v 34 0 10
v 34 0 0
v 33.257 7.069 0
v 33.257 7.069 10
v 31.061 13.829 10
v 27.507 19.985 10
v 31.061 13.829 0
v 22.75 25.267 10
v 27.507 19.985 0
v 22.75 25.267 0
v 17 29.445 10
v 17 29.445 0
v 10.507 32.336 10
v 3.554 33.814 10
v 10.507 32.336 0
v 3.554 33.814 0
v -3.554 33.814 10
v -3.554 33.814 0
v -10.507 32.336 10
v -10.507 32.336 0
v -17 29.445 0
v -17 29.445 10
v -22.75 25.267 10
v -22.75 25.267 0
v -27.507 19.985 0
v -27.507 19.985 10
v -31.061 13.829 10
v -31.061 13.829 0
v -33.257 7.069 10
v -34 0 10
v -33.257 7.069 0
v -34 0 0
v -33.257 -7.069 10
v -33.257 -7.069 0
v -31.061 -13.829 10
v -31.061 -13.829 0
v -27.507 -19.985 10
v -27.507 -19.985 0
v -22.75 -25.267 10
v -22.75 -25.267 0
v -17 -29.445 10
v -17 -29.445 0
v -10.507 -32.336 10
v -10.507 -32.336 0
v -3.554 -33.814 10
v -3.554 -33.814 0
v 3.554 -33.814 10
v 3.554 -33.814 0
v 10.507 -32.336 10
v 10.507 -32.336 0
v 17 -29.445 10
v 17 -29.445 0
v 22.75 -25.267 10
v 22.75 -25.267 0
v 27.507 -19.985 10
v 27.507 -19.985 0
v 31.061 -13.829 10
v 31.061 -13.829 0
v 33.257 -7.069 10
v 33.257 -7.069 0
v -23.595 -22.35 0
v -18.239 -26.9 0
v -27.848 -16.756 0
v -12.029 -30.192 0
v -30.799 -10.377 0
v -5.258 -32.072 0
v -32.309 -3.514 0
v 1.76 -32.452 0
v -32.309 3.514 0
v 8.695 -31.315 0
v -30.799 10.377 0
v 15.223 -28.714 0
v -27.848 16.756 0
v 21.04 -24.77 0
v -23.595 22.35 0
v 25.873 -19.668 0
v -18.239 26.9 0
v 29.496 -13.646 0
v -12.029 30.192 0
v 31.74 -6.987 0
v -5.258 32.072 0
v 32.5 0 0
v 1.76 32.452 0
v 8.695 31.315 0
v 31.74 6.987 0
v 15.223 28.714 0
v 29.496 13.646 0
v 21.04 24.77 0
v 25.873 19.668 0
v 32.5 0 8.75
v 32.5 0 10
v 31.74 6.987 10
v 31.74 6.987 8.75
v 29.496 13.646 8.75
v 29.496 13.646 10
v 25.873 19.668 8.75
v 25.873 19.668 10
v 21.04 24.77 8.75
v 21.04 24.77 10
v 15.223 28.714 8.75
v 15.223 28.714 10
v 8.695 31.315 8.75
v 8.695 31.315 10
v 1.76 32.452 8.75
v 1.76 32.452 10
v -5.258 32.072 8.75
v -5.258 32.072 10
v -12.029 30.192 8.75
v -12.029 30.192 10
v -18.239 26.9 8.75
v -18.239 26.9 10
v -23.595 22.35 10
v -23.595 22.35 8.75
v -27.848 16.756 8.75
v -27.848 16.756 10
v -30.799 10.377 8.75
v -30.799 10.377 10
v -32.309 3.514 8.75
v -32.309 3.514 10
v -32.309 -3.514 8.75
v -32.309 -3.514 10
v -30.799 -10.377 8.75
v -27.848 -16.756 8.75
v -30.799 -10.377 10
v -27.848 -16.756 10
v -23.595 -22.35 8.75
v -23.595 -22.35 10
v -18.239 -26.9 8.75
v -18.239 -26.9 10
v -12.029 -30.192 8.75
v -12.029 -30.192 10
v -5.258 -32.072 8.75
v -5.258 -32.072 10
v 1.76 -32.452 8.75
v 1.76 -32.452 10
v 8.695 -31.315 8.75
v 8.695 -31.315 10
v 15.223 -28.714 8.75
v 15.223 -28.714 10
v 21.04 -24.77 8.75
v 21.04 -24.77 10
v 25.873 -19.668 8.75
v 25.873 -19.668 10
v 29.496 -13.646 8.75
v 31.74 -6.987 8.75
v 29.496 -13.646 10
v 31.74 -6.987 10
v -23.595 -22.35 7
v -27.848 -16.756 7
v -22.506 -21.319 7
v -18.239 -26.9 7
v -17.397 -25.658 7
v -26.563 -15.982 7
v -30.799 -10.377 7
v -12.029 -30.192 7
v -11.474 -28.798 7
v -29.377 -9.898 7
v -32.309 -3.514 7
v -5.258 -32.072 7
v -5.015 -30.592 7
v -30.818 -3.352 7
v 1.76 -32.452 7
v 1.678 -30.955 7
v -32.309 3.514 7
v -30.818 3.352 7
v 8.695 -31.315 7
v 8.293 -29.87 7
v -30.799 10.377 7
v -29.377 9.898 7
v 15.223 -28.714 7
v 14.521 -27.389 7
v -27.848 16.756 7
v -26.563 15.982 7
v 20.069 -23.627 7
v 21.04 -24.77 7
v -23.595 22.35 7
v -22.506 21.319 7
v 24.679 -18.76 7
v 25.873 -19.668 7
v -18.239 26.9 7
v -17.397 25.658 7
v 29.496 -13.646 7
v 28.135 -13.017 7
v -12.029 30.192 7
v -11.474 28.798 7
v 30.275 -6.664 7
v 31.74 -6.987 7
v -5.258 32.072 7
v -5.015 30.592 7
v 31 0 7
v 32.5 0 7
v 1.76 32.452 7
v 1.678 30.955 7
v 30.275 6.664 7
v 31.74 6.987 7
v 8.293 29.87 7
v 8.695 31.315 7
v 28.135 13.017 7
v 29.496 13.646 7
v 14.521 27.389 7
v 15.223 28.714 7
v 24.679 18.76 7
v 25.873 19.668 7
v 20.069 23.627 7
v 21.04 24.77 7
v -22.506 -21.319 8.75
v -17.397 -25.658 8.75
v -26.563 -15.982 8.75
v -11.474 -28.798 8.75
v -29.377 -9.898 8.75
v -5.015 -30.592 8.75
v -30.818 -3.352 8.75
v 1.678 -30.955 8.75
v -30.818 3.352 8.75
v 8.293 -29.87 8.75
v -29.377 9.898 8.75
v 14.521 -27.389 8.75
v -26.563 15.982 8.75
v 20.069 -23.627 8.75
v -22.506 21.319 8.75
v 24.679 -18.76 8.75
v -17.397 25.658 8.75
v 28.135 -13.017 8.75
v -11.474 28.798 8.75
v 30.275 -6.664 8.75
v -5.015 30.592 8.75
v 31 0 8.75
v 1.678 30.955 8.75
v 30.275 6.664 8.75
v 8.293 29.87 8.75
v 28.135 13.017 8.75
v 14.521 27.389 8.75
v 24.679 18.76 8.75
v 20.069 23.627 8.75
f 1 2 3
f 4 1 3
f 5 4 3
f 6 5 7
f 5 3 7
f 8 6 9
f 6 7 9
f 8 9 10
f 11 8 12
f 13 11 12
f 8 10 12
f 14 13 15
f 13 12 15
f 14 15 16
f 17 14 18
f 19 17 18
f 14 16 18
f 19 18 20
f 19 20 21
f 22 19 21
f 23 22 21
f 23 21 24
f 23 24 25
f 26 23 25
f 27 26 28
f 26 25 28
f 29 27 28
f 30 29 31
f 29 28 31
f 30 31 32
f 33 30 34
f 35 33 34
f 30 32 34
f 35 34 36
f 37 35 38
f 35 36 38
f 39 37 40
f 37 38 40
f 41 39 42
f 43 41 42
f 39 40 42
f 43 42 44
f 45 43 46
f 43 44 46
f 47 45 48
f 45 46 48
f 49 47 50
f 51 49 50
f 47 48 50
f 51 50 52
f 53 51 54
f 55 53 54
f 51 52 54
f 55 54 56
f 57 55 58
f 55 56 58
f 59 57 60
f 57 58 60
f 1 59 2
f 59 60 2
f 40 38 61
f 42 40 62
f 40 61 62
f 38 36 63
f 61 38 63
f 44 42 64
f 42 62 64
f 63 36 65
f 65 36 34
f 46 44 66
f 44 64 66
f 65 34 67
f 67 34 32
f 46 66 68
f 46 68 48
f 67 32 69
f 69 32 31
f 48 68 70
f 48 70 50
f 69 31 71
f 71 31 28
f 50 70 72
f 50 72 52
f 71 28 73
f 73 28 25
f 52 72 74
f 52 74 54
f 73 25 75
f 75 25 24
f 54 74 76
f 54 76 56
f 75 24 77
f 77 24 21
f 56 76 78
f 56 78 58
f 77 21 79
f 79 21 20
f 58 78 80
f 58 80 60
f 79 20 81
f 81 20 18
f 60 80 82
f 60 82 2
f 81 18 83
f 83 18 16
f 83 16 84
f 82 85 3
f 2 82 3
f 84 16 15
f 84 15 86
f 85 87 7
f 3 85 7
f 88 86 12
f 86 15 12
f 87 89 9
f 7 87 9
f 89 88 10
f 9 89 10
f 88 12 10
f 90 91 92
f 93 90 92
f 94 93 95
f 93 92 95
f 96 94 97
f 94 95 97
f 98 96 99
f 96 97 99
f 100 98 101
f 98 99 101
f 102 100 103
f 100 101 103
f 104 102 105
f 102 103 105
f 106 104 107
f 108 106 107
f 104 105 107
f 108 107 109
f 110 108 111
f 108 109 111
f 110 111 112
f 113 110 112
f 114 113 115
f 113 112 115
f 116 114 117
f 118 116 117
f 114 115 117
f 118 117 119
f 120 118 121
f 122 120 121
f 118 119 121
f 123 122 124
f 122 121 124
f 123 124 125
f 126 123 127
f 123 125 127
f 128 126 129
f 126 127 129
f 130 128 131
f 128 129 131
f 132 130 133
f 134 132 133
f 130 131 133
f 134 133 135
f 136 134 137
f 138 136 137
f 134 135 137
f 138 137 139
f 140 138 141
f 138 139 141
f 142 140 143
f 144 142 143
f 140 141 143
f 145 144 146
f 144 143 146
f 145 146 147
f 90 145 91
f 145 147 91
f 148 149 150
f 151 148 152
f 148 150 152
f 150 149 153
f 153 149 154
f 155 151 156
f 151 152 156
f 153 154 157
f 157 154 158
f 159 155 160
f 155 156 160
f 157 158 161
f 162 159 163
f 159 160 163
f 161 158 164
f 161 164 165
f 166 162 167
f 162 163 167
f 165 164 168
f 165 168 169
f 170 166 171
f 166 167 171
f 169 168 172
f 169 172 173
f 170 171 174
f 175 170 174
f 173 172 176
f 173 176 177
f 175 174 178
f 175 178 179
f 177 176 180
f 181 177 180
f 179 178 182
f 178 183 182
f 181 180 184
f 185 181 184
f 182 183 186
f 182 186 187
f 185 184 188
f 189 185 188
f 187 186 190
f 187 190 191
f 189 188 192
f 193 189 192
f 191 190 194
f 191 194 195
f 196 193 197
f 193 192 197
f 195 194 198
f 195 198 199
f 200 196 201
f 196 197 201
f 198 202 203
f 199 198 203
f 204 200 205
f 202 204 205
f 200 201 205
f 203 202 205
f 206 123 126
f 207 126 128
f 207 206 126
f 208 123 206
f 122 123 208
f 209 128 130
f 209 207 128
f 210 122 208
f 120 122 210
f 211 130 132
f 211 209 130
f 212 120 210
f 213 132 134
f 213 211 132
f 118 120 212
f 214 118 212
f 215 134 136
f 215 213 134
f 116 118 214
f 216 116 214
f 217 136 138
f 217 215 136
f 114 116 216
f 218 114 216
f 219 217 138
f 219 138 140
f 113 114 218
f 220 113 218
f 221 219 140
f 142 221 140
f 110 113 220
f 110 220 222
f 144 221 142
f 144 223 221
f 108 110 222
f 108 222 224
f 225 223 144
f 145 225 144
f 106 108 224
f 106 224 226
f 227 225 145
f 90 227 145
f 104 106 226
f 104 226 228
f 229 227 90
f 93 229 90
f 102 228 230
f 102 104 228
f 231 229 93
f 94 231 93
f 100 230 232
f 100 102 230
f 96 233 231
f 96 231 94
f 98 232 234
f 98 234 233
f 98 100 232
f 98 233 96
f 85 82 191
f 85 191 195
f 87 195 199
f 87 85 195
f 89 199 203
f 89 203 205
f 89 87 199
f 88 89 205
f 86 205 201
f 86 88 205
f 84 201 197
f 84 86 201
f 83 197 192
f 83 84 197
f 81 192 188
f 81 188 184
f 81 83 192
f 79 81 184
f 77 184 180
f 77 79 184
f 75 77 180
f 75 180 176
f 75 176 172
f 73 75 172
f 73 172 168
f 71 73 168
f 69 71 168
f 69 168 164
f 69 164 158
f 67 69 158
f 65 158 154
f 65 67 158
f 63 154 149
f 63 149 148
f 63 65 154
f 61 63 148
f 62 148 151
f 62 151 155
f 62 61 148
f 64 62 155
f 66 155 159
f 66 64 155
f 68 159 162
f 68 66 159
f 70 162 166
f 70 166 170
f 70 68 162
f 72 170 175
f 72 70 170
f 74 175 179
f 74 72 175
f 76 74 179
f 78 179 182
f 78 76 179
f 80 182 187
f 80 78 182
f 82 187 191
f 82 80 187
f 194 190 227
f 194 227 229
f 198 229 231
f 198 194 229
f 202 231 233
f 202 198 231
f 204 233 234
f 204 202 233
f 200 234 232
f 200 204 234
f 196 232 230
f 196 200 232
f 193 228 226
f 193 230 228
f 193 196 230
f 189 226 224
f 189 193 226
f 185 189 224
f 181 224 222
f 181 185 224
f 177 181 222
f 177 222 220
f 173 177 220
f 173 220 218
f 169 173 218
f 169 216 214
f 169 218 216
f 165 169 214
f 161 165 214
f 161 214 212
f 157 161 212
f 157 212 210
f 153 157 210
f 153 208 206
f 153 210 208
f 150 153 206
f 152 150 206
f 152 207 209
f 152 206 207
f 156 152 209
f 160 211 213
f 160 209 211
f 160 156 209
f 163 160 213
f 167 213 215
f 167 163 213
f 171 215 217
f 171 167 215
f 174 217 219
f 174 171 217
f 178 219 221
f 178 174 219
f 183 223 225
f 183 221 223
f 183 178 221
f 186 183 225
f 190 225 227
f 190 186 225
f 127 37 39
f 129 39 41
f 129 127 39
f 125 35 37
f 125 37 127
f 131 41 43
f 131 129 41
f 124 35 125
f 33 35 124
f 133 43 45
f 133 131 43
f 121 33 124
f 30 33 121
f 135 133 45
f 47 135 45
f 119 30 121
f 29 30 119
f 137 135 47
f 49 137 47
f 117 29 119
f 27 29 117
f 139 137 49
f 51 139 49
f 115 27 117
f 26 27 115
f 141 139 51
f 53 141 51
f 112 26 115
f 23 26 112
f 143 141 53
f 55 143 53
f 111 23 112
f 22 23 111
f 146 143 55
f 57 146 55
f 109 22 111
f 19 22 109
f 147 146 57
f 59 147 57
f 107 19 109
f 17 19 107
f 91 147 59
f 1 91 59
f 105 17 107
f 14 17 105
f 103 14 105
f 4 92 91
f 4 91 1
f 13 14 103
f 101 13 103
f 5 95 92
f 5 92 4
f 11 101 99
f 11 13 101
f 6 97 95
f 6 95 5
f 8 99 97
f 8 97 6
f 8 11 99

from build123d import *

# Parameters (mm, degrees)
SKETCH_R        = 34
SKETCH_R_2      = 31
PAD_DEPTH       = 10
SKETCH001_R     = 32.5
POCKET_DEPTH    = 7
SKETCH002_R     = 32.5
POCKET001_DEPTH = 1.25


with BuildPart() as part:
    # Sketch → Pad (new body)
    with BuildSketch(Plane.XY):
        Circle(SKETCH_R)
        Circle(SKETCH_R_2, mode=Mode.SUBTRACT)
    extrude(amount=PAD_DEPTH)

    # Sketch001 → Pocket (cut)
    with BuildSketch(Plane.XY):
        Circle(SKETCH001_R)
    extrude(amount=POCKET_DEPTH, mode=Mode.SUBTRACT)

    # Sketch002 → Pocket001 (cut)
    with BuildSketch(Plane.XY.offset(10)):
        Circle(SKETCH002_R)
    extrude(amount=-POCKET001_DEPTH, mode=Mode.SUBTRACT)


solid = part.part
